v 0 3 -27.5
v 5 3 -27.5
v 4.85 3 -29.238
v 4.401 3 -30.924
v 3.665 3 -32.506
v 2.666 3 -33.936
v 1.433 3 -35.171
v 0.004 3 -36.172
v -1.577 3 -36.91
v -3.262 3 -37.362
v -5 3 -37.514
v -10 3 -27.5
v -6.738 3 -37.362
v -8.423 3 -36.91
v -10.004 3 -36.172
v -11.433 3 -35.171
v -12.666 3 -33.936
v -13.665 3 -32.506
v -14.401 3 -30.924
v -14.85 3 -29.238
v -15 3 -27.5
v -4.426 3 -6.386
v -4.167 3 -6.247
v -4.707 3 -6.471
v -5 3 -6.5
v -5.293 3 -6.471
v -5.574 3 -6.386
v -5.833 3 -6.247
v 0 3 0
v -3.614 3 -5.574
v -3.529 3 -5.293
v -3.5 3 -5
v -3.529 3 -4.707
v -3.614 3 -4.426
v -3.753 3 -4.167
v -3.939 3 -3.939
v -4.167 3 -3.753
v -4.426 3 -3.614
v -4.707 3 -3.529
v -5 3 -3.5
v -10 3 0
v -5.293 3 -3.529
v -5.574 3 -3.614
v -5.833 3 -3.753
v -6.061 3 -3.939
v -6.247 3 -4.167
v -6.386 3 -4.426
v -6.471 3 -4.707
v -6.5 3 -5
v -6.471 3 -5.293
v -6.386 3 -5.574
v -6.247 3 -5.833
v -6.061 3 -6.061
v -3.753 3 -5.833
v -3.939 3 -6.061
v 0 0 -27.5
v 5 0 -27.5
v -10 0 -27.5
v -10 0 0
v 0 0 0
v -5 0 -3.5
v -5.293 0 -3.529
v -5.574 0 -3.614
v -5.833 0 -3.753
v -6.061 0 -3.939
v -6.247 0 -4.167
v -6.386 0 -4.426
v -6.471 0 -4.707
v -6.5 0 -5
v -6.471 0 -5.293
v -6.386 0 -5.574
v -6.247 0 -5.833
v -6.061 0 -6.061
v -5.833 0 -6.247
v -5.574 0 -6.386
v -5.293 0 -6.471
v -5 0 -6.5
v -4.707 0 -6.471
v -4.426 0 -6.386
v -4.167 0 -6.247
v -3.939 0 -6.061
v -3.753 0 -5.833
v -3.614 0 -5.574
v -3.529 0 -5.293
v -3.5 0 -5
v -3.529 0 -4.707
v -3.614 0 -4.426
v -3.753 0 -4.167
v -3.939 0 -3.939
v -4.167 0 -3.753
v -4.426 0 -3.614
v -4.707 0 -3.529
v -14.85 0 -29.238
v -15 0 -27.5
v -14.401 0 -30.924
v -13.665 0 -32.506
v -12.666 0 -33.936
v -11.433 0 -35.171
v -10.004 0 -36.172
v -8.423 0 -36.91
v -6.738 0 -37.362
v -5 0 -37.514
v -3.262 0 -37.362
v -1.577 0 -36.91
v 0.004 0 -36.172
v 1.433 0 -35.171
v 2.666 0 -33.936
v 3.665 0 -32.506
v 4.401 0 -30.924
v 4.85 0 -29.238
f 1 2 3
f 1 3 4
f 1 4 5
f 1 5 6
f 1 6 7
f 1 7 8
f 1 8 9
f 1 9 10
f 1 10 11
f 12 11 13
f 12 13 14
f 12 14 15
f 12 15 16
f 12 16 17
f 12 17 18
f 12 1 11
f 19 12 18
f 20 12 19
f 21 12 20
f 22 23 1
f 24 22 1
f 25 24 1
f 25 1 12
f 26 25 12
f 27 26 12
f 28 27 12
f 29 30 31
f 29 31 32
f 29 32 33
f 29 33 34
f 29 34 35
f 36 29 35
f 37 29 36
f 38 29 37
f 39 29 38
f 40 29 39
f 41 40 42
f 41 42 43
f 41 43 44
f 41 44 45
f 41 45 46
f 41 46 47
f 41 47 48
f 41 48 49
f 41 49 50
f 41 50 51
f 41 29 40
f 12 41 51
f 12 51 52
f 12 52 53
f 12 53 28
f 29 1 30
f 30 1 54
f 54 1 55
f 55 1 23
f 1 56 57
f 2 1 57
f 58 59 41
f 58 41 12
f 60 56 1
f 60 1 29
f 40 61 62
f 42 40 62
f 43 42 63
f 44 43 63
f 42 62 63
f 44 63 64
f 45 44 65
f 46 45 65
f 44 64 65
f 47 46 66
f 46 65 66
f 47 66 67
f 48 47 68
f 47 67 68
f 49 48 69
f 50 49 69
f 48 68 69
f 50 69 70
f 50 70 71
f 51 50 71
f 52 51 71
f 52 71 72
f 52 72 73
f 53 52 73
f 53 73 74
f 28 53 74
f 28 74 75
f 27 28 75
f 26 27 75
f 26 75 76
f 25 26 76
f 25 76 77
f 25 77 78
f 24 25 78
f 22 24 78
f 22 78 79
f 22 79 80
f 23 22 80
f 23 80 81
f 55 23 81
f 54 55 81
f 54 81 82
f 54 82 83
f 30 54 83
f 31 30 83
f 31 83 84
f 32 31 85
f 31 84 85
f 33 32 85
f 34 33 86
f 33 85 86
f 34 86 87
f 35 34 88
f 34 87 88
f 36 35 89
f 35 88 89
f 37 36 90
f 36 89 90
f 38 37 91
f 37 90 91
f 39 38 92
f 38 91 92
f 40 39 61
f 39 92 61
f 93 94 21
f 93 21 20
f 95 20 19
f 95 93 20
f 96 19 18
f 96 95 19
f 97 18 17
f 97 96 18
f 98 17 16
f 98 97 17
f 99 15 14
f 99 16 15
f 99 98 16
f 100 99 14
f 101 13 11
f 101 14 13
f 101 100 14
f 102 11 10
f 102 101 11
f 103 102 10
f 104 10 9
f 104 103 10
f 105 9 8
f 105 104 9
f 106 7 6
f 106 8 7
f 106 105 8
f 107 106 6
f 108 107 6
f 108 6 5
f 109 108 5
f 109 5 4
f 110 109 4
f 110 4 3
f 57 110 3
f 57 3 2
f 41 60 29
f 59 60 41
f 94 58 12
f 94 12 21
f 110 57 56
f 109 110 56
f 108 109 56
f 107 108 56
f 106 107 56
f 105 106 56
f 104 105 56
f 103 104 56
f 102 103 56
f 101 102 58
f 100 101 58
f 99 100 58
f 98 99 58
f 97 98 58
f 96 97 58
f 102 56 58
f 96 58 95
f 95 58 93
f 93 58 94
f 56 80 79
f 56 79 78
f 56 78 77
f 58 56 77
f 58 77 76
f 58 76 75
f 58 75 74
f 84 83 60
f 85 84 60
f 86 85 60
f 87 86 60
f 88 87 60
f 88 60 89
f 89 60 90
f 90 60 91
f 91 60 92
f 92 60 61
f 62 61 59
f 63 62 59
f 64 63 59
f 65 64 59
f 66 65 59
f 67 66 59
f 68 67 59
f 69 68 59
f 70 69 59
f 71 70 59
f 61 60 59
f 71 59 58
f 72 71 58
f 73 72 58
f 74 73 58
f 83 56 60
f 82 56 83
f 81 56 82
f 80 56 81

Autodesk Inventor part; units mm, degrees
ref_plane "YZ Plane" through (0, 0, 0) normal (1, 0, 0) x (0, 1, 0)
ref_plane "XZ Plane" through (0, 0, 0) normal (0, 1, 0) x (-1, 0, 0)
ref_plane "XY Plane" through (0, 0, 0) normal (0, 0, 1) x (1, 0, 0)
sketch "Sketch1" plane through (0, 0, 0) normal (0, 1, 0) x (-1, 0, 0)
  line L0 (0, 0) -> (10, 0)
  line L1 (10, 0) -> (10, -27.5)
  line L2 (10, -27.5) -> (0, -27.5)
  line L3 (0, -27.5) -> (0, 0)
  line L4 (10, -27.5) -> (15, -27.5)
  line L5 (0, -27.5) -> (-5, -27.5)
  arc A0 (-5, -27.5) -> (15, -27.5) centre (5, -27.5143) ccw
  dimension "d0" = 10
  dimension "d1" = 27.5
  dimension "d2" = 5
  dimension "d3" = 5
extrude "Extrusion1" add sketch "Sketch1" along normal blind 3
sketch "Sketch2" plane through (0, 3, 0) normal (0, 1, 0) x (1, 0, 0)
  circle A0 centre (-5, 5) radius 1.5
  line L0 (-10, 0) -> (0, 0) projected
  line L1 (-10, 27.5) -> (-10, 0) projected
  dimension "d6" = 3
  dimension "d7" = 5
  dimension "d8" = 5
hole "Hole1" at (-5, 3, -5) direction (0, -1, 0) diameter 3 end through all
properties part number "fixing"
